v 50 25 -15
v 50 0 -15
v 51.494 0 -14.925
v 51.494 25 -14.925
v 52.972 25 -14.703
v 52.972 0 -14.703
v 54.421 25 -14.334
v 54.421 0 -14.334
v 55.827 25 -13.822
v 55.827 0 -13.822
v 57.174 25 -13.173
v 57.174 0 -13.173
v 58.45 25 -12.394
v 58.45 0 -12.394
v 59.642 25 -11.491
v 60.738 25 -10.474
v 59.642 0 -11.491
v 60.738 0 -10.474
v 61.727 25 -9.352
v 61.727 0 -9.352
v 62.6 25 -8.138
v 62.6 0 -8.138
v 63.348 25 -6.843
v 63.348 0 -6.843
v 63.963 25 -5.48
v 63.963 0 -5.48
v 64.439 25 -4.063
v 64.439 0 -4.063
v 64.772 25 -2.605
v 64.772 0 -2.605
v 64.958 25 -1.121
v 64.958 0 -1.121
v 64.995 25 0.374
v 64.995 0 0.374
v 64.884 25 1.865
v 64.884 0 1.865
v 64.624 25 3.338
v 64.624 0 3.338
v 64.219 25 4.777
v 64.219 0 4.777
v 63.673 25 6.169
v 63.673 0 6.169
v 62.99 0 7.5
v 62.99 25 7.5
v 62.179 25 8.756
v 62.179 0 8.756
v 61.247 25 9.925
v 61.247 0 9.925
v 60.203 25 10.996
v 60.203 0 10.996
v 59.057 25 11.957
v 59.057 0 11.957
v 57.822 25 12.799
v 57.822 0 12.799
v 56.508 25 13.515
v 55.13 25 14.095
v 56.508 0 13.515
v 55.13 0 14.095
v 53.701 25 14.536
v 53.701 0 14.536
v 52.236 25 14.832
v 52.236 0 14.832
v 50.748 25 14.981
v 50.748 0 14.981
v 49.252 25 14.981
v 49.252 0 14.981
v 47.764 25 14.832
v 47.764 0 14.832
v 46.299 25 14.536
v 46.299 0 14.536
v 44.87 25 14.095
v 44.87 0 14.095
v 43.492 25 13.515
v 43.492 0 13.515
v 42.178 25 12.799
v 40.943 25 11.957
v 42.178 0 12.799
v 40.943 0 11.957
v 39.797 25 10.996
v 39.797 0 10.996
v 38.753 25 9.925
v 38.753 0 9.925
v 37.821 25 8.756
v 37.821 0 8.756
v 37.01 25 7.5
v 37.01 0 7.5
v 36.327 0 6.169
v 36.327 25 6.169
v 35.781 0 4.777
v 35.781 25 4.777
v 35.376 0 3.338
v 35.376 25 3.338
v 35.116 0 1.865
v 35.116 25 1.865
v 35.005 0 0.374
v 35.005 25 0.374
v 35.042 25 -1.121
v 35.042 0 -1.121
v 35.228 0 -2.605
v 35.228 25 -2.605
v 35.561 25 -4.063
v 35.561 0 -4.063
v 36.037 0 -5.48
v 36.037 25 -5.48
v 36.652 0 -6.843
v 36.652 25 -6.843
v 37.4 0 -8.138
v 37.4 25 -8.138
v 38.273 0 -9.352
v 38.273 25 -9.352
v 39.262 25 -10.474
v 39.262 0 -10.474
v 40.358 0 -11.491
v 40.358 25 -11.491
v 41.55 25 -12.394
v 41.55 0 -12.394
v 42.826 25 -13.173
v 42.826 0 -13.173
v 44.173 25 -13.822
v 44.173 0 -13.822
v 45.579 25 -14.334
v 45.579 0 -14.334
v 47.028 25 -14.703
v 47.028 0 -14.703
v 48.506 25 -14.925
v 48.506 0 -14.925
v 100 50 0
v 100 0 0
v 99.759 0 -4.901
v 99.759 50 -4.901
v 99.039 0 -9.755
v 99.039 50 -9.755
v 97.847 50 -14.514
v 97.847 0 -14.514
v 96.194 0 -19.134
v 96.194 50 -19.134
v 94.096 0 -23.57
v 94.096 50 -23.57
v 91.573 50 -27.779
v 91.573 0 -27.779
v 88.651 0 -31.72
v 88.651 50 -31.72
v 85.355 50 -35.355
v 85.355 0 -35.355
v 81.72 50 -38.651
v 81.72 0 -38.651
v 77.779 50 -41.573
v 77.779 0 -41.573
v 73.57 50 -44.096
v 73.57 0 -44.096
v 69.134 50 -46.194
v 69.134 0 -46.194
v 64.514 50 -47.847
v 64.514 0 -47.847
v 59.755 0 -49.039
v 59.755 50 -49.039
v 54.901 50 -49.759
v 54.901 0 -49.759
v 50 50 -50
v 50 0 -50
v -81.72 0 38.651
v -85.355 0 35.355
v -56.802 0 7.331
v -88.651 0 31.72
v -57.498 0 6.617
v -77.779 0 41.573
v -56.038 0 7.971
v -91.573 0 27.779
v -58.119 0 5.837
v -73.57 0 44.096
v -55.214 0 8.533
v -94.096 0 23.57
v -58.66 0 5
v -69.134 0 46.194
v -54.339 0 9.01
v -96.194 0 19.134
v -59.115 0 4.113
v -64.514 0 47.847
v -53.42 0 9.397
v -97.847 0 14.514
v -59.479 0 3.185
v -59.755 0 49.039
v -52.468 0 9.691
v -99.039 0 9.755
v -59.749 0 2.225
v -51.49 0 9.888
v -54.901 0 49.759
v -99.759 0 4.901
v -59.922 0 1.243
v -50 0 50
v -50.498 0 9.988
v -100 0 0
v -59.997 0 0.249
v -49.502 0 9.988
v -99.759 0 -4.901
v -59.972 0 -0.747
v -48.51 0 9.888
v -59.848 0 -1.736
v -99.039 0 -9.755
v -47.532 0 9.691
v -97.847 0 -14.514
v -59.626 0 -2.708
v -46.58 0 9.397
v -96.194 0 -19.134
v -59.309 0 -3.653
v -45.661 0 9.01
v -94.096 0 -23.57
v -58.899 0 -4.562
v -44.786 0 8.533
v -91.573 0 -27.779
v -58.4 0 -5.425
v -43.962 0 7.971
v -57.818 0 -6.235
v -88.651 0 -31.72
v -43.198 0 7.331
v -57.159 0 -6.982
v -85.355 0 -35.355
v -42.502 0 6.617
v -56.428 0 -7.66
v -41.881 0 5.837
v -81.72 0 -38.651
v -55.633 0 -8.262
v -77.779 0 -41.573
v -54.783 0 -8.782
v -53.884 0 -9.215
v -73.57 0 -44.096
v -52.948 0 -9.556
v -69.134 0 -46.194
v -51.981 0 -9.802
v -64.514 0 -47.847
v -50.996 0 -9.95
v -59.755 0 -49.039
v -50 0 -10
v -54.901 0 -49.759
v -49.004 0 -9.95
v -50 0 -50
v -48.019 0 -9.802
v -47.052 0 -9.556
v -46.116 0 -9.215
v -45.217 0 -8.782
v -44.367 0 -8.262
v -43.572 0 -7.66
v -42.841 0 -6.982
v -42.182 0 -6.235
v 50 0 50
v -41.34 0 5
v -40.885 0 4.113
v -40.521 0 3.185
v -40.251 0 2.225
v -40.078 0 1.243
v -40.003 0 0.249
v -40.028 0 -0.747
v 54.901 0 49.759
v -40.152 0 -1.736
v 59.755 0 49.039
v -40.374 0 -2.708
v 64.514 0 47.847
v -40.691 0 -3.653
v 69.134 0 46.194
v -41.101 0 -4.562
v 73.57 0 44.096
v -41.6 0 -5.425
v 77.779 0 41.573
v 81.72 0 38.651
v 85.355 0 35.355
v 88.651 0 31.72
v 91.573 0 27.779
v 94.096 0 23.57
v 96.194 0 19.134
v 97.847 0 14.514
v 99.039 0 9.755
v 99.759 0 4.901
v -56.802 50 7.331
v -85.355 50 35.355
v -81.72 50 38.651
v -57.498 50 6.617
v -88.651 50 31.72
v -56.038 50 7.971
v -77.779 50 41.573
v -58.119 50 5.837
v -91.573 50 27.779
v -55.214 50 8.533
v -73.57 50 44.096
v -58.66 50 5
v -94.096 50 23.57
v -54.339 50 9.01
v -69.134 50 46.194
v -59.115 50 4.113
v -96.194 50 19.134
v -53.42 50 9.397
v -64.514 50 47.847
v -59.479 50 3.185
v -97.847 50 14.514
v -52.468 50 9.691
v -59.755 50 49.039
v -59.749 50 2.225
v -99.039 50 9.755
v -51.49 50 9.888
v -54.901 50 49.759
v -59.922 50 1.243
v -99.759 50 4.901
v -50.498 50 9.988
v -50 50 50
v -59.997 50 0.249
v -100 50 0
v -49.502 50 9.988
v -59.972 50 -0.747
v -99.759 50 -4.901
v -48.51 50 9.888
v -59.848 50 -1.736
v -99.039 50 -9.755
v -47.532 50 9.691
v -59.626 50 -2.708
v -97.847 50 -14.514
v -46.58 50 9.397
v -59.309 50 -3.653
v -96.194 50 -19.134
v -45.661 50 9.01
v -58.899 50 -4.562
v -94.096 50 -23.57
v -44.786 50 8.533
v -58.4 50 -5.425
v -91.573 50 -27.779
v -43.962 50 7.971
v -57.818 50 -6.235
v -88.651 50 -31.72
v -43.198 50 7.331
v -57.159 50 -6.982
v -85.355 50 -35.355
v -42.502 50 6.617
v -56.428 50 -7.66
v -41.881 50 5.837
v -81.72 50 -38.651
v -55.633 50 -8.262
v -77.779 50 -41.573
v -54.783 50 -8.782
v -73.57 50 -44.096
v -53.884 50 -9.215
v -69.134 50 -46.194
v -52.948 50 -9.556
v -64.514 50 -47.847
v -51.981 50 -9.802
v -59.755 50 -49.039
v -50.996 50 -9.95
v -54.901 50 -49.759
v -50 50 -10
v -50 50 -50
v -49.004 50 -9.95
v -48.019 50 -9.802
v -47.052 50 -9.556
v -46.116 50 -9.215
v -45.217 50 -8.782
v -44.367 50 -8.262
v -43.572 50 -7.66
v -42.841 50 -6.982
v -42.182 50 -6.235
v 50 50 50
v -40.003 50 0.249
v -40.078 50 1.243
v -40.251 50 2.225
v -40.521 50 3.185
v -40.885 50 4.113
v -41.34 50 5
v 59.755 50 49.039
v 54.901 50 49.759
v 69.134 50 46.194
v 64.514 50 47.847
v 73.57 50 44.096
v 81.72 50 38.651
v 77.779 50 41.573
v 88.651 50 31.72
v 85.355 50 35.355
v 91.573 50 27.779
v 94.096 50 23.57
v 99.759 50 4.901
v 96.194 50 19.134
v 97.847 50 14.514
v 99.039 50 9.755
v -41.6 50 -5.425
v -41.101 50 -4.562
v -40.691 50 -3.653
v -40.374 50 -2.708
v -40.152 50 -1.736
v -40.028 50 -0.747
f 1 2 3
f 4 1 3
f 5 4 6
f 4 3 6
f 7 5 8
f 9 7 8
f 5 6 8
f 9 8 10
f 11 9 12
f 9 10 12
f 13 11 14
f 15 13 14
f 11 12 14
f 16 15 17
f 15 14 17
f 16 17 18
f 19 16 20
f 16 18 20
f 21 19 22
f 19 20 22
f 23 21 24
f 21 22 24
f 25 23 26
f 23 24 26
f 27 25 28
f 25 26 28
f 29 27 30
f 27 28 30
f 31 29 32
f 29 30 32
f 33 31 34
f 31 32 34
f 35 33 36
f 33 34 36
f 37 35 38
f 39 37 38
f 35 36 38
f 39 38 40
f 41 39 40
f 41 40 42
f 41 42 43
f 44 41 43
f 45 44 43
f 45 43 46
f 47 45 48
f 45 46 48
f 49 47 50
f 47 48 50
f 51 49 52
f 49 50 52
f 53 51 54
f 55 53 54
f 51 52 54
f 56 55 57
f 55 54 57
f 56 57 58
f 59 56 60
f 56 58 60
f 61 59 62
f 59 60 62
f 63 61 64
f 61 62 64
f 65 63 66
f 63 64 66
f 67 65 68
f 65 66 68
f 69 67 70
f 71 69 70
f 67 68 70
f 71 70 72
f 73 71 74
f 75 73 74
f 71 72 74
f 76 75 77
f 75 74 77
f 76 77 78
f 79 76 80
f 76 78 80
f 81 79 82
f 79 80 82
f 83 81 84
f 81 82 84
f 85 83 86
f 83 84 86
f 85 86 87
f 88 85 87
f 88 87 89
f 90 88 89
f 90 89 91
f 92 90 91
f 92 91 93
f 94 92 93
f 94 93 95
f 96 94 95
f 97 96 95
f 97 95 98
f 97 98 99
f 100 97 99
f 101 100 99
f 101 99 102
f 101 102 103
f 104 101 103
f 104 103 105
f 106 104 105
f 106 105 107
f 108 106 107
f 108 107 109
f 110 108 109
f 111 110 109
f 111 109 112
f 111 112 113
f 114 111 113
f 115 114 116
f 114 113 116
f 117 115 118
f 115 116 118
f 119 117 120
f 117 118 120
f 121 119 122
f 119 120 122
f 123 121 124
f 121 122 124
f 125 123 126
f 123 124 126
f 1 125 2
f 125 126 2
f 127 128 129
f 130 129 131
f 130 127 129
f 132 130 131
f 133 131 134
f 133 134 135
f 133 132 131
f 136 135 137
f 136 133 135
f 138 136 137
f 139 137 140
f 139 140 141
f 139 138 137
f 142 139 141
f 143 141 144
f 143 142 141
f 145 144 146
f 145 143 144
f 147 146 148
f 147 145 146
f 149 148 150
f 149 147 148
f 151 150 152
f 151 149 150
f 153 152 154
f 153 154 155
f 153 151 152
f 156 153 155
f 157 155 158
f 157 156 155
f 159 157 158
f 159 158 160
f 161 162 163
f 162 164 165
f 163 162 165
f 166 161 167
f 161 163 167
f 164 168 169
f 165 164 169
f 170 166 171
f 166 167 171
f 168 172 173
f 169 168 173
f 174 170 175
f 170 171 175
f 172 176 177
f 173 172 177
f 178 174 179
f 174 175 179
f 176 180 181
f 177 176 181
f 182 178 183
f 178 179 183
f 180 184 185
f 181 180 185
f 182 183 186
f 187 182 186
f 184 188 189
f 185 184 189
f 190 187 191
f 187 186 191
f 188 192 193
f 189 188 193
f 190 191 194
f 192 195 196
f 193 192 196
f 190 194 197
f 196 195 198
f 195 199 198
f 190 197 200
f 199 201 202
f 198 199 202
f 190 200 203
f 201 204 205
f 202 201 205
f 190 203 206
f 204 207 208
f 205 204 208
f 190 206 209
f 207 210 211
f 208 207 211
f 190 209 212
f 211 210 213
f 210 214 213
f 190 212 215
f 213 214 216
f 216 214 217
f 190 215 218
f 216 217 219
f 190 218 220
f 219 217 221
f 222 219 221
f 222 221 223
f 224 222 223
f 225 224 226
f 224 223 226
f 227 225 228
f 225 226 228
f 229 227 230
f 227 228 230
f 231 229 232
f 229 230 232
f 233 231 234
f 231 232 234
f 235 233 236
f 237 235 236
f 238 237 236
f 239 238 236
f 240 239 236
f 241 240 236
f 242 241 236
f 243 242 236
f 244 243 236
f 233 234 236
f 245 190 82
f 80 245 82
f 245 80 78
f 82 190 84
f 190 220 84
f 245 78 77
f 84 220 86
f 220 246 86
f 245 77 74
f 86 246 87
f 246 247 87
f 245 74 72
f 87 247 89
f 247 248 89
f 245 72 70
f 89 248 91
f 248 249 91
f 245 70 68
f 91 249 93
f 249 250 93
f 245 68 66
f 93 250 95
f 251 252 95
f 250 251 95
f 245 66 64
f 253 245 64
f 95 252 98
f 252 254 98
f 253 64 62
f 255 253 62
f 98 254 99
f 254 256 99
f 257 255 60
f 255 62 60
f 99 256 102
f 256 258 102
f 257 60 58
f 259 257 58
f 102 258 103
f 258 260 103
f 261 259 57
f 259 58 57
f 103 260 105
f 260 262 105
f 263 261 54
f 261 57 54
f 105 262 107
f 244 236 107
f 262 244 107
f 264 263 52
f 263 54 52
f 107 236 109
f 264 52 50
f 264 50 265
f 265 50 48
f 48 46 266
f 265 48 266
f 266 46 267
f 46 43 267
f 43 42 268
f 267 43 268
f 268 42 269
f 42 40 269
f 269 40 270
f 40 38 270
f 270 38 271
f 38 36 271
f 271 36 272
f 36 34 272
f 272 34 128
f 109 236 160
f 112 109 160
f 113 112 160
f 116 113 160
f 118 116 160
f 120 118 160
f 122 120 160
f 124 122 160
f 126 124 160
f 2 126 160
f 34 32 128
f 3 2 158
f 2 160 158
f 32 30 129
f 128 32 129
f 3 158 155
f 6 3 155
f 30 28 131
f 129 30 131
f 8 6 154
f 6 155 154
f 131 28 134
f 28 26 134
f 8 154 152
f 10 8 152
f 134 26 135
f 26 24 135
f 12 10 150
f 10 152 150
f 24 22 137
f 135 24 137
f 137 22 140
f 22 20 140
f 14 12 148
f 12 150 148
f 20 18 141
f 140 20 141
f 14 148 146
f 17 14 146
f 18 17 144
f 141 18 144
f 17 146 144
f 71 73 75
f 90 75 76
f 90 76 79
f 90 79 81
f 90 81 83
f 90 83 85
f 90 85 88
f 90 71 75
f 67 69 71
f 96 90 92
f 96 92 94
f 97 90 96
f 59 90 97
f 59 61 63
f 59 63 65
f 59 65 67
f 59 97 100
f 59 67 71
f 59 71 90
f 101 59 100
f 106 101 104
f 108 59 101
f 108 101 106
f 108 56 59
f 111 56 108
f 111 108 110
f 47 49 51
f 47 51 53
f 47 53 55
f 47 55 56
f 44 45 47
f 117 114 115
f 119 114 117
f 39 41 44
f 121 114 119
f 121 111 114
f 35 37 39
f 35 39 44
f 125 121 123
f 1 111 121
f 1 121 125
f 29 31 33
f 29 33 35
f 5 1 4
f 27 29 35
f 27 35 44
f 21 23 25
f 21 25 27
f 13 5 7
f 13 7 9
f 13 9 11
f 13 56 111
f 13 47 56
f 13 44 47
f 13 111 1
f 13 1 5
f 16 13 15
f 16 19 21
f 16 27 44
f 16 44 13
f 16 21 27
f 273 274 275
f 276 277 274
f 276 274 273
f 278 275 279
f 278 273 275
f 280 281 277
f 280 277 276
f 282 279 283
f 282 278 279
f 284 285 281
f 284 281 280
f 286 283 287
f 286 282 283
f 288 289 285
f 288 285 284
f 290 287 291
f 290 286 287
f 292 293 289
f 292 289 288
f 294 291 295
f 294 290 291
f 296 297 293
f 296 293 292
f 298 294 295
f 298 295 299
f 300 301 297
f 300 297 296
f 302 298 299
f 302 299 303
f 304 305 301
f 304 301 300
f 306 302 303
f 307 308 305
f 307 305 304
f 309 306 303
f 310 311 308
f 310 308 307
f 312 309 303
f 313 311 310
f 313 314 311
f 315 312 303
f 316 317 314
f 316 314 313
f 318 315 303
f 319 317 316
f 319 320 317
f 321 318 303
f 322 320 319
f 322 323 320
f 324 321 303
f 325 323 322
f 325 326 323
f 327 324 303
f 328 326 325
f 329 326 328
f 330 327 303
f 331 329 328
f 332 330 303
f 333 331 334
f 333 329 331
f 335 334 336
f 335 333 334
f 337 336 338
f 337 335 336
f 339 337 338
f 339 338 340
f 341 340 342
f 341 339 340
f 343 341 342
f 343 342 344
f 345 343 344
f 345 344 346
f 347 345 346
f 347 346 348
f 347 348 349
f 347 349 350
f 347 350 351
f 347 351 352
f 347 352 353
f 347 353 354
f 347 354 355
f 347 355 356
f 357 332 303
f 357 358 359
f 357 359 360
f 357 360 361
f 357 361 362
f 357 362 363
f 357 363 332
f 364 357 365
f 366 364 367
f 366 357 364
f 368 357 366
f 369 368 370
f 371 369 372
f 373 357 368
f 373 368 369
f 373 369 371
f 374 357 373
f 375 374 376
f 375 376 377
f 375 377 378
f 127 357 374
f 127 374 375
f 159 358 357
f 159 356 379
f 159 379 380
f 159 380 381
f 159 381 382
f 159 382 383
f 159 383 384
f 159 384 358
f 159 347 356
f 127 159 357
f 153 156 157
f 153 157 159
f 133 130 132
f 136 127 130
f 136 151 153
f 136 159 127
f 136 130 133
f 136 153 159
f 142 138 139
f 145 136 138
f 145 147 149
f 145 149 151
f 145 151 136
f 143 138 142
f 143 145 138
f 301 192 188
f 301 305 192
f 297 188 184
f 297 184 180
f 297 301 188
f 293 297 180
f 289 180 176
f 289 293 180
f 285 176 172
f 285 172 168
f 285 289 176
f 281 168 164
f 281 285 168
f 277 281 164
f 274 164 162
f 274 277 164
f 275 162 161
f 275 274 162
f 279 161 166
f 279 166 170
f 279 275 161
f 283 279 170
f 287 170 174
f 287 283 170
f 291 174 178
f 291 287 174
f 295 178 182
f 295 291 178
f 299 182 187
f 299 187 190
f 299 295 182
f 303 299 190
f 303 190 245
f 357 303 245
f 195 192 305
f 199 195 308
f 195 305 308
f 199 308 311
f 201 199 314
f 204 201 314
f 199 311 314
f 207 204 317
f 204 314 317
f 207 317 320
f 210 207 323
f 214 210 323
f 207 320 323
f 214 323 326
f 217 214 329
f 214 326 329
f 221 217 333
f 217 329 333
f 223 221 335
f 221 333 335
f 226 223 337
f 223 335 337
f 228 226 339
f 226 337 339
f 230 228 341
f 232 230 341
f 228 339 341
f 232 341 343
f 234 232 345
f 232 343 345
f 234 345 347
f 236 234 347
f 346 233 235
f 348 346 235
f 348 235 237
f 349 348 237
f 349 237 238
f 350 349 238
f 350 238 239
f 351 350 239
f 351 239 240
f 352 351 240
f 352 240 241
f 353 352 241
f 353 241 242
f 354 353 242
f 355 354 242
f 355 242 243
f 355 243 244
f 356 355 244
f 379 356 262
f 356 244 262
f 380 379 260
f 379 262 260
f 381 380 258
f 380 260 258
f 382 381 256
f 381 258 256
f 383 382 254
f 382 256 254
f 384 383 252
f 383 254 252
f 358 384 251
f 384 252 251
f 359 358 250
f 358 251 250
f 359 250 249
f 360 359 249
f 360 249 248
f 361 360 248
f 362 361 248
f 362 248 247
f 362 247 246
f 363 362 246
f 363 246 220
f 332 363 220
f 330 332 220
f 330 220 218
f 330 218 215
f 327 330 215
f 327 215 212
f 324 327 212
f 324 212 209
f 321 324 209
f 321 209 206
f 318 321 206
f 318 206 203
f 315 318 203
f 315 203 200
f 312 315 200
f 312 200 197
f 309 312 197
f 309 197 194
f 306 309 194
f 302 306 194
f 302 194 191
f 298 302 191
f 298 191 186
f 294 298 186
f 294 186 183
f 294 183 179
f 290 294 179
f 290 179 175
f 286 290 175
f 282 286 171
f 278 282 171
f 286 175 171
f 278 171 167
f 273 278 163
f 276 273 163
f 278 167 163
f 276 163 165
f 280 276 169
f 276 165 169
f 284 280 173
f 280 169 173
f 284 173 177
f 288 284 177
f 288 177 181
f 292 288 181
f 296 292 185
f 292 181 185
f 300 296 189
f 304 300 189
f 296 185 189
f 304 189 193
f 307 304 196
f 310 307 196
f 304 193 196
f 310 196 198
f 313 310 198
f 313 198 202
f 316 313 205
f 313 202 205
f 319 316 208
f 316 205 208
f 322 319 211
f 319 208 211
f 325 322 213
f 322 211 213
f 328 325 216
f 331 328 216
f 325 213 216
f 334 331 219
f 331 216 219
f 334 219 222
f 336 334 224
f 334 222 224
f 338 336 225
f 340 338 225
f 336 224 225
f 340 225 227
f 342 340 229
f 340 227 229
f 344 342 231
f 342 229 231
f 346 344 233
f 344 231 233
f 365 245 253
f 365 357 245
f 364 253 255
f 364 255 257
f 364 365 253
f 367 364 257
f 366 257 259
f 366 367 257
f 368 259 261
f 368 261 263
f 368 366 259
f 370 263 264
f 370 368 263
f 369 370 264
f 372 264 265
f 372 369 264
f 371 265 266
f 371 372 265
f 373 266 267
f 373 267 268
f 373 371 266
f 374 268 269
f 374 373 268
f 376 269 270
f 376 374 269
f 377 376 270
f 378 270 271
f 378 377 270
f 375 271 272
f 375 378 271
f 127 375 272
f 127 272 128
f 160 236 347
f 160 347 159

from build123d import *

# Parameters (mm, degrees)
ESBO_O2_W                = 200
ESBO_O2_H                = 100
RESSALTO_EXTRUS_O1_DEPTH = 50
FILETE1_R                = 50
ESBO_O3_R                = 15
CORTE_EXTRUS_O1_DEPTH    = 25
ESBO_O4_R                = 10
CORTE_EXTRUS_O2_DEPTH    = 123.474487139


with BuildPart() as part:
    # Esboço2 → Ressalto-extrusão1 (new body)
    with BuildSketch(Plane(origin=(0, 0, 0), x_dir=(1, 0, 0), z_dir=(0, 1, 0))):
        Rectangle(ESBO_O2_W, ESBO_O2_H)
    extrude(amount=RESSALTO_EXTRUS_O1_DEPTH)

    # Filete1
    filete1_edges = [part.edges().sort_by_distance(p)[0] for p in [
        (100, 25, -50),
        (100, 25, 50),
        (-100, 25, -50),
        (-100, 25, 50),
    ]]
    fillet(filete1_edges, radius=FILETE1_R - 0.0001)  # a hair under: the kernel refuses the full size

    # Esboço3 → Corte-extrusão1 (cut)
    with BuildSketch(Plane.XZ):
        with Locations(Location((50, 0, 0), (0, 0, 270))):
            Circle(ESBO_O3_R)
    extrude(amount=-CORTE_EXTRUS_O1_DEPTH, mode=Mode.SUBTRACT)

    # Esboço4 → Corte-extrusão2 (cut, through all)
    with BuildSketch(Plane.XZ):
        with Locations(Location((-50, 0, 0), (0, 0, 270))):
            Circle(ESBO_O4_R)
    extrude(amount=-CORTE_EXTRUS_O2_DEPTH, mode=Mode.SUBTRACT)


solid = part.part
